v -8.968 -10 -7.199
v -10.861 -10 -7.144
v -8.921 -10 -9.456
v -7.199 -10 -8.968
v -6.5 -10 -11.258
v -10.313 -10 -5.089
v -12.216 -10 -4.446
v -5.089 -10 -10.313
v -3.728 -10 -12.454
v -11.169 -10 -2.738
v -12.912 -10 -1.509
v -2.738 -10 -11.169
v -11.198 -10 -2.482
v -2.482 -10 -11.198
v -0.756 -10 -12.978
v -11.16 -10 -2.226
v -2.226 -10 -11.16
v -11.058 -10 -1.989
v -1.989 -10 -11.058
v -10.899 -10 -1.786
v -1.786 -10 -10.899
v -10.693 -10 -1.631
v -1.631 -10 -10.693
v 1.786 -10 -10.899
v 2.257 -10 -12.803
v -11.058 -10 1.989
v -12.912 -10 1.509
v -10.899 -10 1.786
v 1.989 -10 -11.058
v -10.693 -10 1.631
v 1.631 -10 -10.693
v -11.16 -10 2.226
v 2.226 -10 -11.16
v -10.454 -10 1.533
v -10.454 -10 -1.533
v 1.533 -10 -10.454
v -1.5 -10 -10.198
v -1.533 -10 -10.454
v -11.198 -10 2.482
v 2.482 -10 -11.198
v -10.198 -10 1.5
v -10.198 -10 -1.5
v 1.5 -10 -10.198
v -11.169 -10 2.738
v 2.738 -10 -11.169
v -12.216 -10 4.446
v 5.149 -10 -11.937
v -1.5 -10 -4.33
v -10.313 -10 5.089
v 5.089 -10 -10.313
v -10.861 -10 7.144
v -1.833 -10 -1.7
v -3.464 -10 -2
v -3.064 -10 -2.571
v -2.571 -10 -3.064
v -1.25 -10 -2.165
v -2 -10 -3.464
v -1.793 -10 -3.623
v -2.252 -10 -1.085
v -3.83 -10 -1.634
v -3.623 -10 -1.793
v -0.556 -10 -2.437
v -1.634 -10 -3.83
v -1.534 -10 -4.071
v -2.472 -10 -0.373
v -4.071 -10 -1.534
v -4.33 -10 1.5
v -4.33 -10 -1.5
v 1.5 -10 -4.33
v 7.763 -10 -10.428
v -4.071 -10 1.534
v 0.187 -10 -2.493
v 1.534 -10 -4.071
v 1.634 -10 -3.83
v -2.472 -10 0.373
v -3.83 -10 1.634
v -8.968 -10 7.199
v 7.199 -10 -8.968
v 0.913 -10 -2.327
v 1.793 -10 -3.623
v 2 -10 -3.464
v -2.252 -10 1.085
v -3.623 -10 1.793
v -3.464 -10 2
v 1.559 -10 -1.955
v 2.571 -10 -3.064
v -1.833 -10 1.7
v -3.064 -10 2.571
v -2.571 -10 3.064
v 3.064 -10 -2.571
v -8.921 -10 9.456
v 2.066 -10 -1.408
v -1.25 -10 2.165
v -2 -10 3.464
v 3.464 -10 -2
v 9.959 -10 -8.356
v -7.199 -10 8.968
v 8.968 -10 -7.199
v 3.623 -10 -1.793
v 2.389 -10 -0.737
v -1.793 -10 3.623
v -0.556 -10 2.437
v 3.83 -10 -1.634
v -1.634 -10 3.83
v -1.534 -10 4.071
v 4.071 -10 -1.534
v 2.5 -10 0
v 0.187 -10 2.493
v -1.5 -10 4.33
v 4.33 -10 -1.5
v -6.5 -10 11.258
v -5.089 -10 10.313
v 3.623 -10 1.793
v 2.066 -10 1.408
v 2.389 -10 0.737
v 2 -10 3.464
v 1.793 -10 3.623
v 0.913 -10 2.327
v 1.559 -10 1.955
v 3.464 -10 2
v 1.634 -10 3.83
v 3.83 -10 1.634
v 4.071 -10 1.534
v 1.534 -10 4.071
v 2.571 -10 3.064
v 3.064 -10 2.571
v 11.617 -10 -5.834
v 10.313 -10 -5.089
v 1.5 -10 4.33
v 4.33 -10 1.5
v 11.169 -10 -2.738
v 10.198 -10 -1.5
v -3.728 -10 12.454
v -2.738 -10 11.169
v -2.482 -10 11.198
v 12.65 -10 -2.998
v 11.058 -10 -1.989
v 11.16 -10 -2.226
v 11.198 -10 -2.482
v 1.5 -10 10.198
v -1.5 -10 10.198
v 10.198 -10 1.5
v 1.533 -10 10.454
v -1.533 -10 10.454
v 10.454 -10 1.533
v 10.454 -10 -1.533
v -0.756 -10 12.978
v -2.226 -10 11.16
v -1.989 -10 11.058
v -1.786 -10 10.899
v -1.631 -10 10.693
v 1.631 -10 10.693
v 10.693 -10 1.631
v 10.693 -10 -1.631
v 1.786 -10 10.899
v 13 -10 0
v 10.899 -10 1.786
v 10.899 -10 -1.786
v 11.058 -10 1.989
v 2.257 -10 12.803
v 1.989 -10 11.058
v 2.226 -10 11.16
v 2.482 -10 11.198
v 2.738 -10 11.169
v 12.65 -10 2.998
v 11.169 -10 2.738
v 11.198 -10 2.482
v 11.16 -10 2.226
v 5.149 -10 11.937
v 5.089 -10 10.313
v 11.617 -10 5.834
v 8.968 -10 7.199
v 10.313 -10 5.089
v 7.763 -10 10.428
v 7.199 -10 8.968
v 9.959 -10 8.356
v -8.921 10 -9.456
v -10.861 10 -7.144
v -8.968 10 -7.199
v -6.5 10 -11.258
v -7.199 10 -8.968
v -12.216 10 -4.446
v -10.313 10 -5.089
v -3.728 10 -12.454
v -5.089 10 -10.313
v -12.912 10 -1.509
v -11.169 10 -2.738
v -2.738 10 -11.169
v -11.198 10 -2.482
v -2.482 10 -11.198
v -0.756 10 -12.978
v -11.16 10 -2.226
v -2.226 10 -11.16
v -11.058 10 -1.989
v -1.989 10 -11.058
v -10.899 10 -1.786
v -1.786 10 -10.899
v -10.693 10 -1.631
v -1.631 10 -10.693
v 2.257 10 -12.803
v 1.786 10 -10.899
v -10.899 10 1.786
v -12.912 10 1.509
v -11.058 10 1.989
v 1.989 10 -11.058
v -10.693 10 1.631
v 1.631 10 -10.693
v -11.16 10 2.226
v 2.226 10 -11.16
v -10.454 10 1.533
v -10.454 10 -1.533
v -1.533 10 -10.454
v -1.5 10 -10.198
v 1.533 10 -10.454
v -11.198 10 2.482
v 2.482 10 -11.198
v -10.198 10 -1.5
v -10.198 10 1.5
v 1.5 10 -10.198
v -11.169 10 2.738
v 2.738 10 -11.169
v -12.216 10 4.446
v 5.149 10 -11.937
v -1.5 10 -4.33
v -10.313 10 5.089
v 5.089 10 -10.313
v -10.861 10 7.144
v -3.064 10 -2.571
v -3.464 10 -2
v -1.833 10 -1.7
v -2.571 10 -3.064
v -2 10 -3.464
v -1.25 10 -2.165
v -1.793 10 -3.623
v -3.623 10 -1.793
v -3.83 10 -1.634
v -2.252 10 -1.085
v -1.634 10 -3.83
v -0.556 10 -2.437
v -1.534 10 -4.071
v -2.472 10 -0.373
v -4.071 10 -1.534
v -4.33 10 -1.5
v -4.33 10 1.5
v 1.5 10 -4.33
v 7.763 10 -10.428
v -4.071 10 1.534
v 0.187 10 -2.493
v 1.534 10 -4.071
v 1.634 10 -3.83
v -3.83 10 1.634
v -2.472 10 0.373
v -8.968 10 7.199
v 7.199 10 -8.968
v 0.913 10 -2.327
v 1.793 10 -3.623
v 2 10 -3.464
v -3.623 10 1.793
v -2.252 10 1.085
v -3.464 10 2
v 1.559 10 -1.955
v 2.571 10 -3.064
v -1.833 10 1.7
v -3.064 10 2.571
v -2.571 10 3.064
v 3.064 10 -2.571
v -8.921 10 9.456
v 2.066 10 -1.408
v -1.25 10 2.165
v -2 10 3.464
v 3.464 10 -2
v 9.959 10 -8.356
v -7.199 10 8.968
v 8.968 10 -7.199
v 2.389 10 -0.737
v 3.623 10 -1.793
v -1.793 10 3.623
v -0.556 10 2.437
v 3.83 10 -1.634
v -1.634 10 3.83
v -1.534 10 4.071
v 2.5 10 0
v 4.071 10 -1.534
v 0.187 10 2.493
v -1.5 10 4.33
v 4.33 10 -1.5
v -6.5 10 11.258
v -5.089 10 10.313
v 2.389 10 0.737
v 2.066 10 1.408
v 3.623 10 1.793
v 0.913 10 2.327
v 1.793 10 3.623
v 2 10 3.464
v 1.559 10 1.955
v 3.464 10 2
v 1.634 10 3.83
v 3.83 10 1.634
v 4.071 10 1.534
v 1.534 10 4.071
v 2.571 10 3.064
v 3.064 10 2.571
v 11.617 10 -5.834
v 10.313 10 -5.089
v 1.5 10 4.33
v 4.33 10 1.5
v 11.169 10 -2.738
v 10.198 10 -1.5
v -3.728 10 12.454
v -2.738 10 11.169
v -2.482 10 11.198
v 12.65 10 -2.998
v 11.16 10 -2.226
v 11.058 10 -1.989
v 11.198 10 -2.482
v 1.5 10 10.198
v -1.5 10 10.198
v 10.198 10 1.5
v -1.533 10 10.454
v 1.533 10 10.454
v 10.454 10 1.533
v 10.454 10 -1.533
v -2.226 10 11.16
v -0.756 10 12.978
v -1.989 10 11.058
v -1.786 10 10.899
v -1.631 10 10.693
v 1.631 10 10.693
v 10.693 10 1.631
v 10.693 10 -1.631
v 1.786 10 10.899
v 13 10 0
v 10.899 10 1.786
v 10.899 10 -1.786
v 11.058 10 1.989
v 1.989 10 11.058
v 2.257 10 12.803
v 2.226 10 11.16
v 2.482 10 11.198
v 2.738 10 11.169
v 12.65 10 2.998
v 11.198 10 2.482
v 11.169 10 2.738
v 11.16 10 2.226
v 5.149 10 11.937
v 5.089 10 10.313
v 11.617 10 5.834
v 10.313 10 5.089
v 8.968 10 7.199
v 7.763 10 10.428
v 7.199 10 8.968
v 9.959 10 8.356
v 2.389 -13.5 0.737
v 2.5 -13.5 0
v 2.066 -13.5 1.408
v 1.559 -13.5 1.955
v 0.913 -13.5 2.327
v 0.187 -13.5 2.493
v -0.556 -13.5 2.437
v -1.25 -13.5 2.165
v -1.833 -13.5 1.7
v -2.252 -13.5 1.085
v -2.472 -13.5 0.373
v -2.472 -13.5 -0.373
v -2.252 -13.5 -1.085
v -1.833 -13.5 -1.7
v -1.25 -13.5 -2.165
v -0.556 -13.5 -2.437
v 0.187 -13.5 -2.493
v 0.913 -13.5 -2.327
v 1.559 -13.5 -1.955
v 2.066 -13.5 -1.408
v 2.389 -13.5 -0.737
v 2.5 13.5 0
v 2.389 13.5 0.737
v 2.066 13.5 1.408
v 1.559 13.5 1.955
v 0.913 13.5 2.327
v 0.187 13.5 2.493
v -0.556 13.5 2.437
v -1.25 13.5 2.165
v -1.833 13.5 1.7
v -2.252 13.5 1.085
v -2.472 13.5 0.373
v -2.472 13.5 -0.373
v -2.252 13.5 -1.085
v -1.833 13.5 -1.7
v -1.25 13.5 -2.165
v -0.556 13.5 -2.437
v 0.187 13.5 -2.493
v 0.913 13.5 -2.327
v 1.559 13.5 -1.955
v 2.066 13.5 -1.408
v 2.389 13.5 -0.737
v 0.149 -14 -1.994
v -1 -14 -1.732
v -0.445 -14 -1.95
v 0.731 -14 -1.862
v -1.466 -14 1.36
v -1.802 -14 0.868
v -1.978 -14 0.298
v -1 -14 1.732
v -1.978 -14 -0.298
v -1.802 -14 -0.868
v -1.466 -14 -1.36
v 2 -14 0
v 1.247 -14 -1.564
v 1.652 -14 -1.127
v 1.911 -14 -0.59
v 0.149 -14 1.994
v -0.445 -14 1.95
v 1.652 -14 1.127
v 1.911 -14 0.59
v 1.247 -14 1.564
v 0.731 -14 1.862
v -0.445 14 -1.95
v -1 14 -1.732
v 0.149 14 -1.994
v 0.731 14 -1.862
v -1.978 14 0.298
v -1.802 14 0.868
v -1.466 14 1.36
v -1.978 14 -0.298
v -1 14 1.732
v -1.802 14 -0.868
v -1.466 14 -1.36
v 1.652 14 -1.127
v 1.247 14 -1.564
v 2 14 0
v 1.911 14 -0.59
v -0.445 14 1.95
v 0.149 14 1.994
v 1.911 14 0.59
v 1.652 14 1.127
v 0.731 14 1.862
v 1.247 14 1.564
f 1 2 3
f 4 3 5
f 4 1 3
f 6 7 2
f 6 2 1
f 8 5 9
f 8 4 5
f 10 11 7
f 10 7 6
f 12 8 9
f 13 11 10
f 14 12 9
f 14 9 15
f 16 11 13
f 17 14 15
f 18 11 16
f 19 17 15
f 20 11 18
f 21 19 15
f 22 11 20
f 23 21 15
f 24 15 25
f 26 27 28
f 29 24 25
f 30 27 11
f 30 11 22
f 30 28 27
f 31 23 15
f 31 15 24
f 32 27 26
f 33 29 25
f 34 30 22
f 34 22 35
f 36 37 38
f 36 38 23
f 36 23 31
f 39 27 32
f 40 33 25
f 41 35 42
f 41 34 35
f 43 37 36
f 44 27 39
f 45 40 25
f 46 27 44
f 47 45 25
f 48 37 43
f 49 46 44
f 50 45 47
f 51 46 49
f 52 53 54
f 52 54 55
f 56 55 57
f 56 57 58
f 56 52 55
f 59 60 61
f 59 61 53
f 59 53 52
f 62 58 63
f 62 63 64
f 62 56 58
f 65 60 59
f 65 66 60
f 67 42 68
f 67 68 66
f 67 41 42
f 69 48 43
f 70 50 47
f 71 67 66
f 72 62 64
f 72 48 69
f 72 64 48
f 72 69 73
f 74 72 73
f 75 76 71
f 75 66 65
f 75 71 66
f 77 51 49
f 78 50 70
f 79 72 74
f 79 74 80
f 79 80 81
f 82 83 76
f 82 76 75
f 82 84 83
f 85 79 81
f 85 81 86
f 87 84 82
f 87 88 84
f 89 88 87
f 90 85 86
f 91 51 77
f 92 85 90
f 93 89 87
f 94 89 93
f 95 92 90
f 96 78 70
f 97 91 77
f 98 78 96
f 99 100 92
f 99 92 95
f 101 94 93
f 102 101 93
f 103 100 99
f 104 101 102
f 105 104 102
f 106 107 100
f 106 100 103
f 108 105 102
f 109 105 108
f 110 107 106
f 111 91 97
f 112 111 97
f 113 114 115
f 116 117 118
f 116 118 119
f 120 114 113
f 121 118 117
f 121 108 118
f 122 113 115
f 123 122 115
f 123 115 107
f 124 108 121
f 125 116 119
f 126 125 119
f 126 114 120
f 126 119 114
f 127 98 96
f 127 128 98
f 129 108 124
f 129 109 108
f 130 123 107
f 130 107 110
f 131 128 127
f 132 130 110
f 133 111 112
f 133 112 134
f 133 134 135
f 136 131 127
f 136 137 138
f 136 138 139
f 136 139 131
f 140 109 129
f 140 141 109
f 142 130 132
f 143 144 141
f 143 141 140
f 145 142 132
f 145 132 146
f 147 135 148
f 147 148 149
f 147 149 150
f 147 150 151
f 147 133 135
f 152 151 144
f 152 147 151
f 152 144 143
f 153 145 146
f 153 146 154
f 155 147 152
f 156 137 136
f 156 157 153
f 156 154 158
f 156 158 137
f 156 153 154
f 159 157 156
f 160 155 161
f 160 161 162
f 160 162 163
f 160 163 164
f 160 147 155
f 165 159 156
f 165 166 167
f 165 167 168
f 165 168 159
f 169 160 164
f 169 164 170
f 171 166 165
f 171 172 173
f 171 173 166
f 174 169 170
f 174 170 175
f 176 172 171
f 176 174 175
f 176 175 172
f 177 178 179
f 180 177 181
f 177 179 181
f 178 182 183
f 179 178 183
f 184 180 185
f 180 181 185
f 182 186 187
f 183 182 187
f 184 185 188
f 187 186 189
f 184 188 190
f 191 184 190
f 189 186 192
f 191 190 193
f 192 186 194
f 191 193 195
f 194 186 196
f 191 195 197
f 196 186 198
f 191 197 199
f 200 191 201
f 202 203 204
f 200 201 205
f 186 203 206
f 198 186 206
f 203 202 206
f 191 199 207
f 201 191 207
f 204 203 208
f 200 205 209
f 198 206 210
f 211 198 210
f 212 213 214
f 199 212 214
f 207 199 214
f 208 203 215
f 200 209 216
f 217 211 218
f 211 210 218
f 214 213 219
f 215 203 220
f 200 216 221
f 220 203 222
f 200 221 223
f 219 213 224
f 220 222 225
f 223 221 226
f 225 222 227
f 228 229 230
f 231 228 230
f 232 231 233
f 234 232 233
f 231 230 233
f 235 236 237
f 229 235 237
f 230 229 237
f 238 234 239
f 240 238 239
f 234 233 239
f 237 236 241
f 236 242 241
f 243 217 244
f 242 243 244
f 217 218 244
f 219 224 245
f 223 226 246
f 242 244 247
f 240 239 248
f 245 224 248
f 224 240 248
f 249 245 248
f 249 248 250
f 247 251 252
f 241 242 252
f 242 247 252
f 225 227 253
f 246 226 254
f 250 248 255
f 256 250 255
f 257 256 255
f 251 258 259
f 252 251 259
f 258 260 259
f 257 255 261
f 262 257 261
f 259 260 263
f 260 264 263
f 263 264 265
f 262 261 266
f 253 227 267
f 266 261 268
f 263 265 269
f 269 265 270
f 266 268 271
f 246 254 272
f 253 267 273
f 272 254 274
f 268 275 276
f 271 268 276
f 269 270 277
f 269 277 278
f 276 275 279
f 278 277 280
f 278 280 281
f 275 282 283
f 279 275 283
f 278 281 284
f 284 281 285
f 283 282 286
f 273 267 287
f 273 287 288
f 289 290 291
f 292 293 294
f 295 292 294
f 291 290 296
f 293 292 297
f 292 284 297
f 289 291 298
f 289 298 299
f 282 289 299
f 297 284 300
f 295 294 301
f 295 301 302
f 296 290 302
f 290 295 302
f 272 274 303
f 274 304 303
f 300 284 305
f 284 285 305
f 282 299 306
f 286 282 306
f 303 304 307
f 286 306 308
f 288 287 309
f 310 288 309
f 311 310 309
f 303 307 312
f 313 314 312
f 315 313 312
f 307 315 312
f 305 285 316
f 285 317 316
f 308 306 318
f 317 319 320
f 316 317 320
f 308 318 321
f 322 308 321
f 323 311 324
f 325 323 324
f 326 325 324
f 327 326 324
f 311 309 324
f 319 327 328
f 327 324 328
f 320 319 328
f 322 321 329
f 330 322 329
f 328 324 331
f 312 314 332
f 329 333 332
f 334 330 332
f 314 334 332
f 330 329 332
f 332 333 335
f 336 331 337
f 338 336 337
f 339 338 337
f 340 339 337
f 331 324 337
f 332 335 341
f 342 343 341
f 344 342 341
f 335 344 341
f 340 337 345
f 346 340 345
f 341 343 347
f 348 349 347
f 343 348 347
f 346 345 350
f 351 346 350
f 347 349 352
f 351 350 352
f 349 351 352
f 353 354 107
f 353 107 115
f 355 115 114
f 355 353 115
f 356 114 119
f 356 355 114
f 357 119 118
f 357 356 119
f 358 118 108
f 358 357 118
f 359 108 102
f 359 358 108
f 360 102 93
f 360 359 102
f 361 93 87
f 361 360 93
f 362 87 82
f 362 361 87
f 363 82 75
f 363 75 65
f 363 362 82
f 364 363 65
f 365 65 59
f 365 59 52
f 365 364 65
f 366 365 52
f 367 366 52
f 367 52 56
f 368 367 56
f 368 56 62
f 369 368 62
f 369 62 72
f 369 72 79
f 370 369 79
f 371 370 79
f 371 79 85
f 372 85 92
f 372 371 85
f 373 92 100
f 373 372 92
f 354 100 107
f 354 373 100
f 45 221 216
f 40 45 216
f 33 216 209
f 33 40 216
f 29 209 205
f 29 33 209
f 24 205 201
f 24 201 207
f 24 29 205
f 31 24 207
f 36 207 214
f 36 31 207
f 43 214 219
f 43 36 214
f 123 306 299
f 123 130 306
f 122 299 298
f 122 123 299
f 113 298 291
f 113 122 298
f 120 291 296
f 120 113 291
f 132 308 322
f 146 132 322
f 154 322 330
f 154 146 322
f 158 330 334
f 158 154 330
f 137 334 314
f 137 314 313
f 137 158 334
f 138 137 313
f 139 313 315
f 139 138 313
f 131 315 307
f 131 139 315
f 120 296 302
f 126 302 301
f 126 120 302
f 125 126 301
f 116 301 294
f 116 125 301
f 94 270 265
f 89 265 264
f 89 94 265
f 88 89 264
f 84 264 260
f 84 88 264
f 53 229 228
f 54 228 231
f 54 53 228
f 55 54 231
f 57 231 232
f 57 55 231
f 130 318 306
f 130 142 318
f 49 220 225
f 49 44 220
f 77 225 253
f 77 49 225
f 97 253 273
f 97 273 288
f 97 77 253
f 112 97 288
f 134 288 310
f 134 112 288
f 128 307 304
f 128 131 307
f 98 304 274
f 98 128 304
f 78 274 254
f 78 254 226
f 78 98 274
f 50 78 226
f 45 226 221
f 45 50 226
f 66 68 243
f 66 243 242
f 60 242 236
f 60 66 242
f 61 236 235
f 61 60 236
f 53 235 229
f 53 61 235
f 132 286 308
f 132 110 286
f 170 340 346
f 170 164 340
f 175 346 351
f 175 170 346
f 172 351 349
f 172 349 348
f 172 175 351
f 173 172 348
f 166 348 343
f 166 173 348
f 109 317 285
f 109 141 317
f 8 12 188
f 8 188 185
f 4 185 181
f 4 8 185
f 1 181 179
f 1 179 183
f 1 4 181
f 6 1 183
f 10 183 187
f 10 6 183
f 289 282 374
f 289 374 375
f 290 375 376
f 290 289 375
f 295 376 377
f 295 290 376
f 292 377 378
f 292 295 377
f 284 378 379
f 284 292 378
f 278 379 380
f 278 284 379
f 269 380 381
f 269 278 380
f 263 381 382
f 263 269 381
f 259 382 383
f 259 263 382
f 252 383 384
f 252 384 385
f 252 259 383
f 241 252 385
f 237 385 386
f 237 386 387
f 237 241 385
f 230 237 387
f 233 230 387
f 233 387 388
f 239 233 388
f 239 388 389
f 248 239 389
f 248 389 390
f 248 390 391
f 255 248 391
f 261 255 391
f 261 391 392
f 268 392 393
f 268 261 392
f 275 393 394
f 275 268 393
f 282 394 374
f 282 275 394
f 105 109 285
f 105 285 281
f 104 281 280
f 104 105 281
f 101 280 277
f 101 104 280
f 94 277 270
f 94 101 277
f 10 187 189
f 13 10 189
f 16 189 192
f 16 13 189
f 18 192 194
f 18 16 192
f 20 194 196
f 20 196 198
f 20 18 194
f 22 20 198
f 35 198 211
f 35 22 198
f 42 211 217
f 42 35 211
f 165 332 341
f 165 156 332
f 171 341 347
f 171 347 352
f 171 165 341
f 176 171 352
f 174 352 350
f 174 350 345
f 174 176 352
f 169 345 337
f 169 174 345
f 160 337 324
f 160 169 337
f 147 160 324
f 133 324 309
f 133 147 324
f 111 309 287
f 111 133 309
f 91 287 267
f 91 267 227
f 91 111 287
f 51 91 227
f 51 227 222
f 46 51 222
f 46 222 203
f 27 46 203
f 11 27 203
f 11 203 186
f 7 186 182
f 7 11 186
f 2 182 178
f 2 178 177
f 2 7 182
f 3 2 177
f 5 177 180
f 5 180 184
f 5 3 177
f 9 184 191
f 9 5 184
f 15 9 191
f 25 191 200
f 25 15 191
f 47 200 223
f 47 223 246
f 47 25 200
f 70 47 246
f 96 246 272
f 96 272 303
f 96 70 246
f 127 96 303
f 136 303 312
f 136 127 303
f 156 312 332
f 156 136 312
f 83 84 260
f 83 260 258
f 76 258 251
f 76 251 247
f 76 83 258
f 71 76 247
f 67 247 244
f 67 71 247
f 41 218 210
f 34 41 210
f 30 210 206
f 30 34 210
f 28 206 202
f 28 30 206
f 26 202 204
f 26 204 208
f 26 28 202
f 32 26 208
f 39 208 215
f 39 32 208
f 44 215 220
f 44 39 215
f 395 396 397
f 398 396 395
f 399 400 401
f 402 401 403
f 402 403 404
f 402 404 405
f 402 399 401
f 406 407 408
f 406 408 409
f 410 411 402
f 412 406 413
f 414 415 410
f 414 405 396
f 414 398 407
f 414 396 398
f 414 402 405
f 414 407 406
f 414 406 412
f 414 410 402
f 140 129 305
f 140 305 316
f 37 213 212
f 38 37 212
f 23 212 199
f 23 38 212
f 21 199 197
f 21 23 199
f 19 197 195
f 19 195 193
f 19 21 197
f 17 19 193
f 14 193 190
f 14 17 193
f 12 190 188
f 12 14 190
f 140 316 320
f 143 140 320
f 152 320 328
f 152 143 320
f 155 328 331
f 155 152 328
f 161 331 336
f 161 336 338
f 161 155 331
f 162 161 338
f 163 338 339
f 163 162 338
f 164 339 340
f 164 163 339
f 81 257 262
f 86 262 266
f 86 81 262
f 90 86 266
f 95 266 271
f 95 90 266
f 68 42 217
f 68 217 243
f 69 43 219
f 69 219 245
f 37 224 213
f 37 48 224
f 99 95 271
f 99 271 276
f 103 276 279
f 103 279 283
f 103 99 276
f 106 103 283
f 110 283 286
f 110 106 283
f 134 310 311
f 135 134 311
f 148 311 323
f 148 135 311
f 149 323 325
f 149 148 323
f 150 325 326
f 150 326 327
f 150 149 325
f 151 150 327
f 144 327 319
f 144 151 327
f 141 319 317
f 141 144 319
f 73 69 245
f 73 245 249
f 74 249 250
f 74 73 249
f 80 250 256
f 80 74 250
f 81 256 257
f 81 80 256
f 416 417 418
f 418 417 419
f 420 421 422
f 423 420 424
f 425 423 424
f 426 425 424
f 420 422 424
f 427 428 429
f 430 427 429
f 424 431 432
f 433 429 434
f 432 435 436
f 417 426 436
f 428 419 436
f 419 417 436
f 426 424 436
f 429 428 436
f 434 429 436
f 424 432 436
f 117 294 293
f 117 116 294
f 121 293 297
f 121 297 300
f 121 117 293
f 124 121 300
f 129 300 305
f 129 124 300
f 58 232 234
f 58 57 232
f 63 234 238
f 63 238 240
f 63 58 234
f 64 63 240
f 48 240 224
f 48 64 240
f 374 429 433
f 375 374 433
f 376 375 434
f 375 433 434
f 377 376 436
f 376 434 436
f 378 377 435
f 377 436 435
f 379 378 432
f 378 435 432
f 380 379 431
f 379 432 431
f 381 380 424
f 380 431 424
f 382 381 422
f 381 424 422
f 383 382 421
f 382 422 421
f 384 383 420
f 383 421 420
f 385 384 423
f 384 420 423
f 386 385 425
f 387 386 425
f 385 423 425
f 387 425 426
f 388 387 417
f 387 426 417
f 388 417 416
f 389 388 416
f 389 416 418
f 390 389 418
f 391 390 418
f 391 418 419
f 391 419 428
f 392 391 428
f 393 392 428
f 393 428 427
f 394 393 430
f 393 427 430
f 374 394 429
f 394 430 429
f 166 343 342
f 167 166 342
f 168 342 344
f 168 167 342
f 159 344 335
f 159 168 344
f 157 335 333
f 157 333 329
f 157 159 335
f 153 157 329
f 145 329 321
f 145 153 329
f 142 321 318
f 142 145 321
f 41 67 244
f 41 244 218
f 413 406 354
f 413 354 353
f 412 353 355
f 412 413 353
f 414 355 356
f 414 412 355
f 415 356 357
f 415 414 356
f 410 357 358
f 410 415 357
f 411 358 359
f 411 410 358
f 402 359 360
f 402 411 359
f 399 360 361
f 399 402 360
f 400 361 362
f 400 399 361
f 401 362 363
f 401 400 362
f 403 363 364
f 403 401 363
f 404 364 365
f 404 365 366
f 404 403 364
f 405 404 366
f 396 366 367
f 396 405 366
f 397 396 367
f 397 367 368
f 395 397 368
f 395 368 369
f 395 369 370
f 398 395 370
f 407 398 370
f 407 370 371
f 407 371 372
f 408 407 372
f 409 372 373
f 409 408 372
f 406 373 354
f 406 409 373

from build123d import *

# Parameters (mm, degrees)
F0_R     = 13
F1_DEPTH = 10
F2_R     = 2.5
F3_DEPTH = 14
F4_SIZE  = 0.5


with BuildPart() as f1:
    # F0 (on Front) → F1 (new body, symmetric)
    with BuildSketch(Plane.XZ):
        Circle(F0_R)
        with BuildLine():
            ThreePointArc((-2.738095, -11.169281), (-8.131728, -8.131728), (-11.169281, -2.738095))
            ThreePointArc((-11.169281, -2.738095), (-10.984835, -1.882787), (-10.198039, -1.5))
            Line((-10.198039, -1.5), (-4.330127, -1.5))
            ThreePointArc((-4.330127, -1.5), (-3.830127, -1.633975), (-3.464102, -2))
            ThreePointArc((-3.464102, -2), (-2.828427, -2.828427), (-2, -3.464102))
            ThreePointArc((-2, -3.464102), (-1.633975, -3.830127), (-1.5, -4.330127))
            Line((-1.5, -4.330127), (-1.5, -10.198039))
            ThreePointArc((-1.5, -10.198039), (-1.882787, -10.984835), (-2.738095, -11.169281))
        make_face(mode=Mode.SUBTRACT)
        with BuildLine():
            Line((1.5, -10.198039), (1.5, -4.330127))
            ThreePointArc((1.5, -4.330127), (1.633975, -3.830127), (2, -3.464102))
            ThreePointArc((2, -3.464102), (2.828427, -2.828427), (3.464102, -2))
            ThreePointArc((3.464102, -2), (3.830127, -1.633975), (4.330127, -1.5))
            Line((4.330127, -1.5), (10.198039, -1.5))
            ThreePointArc((10.198039, -1.5), (10.984835, -1.882787), (11.169281, -2.738095))
            ThreePointArc((11.169281, -2.738095), (8.131728, -8.131728), (2.738095, -11.169281))
            ThreePointArc((2.738095, -11.169281), (1.882787, -10.984835), (1.5, -10.198039))
        make_face(mode=Mode.SUBTRACT)
        with BuildLine():
            ThreePointArc((-1.5, 4.330127), (-1.633975, 3.830127), (-2, 3.464102))
            ThreePointArc((-2, 3.464102), (-2.828427, 2.828427), (-3.464102, 2))
            ThreePointArc((-3.464102, 2), (-3.830127, 1.633975), (-4.330127, 1.5))
            Line((-4.330127, 1.5), (-10.198039, 1.5))
            ThreePointArc((-10.198039, 1.5), (-10.984835, 1.882787), (-11.169281, 2.738095))
            ThreePointArc((-11.169281, 2.738095), (-8.131728, 8.131728), (-2.738095, 11.169281))
            ThreePointArc((-2.738095, 11.169281), (-1.882787, 10.984835), (-1.5, 10.198039))
            Line((-1.5, 10.198039), (-1.5, 4.330127))
        make_face(mode=Mode.SUBTRACT)
        with BuildLine():
            Line((1.5, 4.330127), (1.5, 10.198039))
            ThreePointArc((1.5, 10.198039), (1.882787, 10.984835), (2.738095, 11.169281))
            ThreePointArc((2.738095, 11.169281), (8.131728, 8.131728), (11.169281, 2.738095))
            ThreePointArc((11.169281, 2.738095), (10.984835, 1.882787), (10.198039, 1.5))
            Line((10.198039, 1.5), (4.330127, 1.5))
            ThreePointArc((4.330127, 1.5), (3.830127, 1.633975), (3.464102, 2))
            ThreePointArc((3.464102, 2), (2.828427, 2.828427), (2, 3.464102))
            ThreePointArc((2, 3.464102), (1.633975, 3.830127), (1.5, 4.330127))
        make_face(mode=Mode.SUBTRACT)
    extrude(amount=F1_DEPTH, both=True)

    # F2 (on Front) → F3 (join, symmetric)
    with BuildSketch(Plane.XZ):
        Circle(F2_R)
    extrude(amount=F3_DEPTH, both=True)

    # F4
    f4_edges = [f1.edges().sort_by_distance(p)[0] for p in [
        (-2.5, -14, 0),
        (-2.5, 14, 0),
    ]]
    chamfer(f4_edges, length=F4_SIZE)


solid = f1.part
